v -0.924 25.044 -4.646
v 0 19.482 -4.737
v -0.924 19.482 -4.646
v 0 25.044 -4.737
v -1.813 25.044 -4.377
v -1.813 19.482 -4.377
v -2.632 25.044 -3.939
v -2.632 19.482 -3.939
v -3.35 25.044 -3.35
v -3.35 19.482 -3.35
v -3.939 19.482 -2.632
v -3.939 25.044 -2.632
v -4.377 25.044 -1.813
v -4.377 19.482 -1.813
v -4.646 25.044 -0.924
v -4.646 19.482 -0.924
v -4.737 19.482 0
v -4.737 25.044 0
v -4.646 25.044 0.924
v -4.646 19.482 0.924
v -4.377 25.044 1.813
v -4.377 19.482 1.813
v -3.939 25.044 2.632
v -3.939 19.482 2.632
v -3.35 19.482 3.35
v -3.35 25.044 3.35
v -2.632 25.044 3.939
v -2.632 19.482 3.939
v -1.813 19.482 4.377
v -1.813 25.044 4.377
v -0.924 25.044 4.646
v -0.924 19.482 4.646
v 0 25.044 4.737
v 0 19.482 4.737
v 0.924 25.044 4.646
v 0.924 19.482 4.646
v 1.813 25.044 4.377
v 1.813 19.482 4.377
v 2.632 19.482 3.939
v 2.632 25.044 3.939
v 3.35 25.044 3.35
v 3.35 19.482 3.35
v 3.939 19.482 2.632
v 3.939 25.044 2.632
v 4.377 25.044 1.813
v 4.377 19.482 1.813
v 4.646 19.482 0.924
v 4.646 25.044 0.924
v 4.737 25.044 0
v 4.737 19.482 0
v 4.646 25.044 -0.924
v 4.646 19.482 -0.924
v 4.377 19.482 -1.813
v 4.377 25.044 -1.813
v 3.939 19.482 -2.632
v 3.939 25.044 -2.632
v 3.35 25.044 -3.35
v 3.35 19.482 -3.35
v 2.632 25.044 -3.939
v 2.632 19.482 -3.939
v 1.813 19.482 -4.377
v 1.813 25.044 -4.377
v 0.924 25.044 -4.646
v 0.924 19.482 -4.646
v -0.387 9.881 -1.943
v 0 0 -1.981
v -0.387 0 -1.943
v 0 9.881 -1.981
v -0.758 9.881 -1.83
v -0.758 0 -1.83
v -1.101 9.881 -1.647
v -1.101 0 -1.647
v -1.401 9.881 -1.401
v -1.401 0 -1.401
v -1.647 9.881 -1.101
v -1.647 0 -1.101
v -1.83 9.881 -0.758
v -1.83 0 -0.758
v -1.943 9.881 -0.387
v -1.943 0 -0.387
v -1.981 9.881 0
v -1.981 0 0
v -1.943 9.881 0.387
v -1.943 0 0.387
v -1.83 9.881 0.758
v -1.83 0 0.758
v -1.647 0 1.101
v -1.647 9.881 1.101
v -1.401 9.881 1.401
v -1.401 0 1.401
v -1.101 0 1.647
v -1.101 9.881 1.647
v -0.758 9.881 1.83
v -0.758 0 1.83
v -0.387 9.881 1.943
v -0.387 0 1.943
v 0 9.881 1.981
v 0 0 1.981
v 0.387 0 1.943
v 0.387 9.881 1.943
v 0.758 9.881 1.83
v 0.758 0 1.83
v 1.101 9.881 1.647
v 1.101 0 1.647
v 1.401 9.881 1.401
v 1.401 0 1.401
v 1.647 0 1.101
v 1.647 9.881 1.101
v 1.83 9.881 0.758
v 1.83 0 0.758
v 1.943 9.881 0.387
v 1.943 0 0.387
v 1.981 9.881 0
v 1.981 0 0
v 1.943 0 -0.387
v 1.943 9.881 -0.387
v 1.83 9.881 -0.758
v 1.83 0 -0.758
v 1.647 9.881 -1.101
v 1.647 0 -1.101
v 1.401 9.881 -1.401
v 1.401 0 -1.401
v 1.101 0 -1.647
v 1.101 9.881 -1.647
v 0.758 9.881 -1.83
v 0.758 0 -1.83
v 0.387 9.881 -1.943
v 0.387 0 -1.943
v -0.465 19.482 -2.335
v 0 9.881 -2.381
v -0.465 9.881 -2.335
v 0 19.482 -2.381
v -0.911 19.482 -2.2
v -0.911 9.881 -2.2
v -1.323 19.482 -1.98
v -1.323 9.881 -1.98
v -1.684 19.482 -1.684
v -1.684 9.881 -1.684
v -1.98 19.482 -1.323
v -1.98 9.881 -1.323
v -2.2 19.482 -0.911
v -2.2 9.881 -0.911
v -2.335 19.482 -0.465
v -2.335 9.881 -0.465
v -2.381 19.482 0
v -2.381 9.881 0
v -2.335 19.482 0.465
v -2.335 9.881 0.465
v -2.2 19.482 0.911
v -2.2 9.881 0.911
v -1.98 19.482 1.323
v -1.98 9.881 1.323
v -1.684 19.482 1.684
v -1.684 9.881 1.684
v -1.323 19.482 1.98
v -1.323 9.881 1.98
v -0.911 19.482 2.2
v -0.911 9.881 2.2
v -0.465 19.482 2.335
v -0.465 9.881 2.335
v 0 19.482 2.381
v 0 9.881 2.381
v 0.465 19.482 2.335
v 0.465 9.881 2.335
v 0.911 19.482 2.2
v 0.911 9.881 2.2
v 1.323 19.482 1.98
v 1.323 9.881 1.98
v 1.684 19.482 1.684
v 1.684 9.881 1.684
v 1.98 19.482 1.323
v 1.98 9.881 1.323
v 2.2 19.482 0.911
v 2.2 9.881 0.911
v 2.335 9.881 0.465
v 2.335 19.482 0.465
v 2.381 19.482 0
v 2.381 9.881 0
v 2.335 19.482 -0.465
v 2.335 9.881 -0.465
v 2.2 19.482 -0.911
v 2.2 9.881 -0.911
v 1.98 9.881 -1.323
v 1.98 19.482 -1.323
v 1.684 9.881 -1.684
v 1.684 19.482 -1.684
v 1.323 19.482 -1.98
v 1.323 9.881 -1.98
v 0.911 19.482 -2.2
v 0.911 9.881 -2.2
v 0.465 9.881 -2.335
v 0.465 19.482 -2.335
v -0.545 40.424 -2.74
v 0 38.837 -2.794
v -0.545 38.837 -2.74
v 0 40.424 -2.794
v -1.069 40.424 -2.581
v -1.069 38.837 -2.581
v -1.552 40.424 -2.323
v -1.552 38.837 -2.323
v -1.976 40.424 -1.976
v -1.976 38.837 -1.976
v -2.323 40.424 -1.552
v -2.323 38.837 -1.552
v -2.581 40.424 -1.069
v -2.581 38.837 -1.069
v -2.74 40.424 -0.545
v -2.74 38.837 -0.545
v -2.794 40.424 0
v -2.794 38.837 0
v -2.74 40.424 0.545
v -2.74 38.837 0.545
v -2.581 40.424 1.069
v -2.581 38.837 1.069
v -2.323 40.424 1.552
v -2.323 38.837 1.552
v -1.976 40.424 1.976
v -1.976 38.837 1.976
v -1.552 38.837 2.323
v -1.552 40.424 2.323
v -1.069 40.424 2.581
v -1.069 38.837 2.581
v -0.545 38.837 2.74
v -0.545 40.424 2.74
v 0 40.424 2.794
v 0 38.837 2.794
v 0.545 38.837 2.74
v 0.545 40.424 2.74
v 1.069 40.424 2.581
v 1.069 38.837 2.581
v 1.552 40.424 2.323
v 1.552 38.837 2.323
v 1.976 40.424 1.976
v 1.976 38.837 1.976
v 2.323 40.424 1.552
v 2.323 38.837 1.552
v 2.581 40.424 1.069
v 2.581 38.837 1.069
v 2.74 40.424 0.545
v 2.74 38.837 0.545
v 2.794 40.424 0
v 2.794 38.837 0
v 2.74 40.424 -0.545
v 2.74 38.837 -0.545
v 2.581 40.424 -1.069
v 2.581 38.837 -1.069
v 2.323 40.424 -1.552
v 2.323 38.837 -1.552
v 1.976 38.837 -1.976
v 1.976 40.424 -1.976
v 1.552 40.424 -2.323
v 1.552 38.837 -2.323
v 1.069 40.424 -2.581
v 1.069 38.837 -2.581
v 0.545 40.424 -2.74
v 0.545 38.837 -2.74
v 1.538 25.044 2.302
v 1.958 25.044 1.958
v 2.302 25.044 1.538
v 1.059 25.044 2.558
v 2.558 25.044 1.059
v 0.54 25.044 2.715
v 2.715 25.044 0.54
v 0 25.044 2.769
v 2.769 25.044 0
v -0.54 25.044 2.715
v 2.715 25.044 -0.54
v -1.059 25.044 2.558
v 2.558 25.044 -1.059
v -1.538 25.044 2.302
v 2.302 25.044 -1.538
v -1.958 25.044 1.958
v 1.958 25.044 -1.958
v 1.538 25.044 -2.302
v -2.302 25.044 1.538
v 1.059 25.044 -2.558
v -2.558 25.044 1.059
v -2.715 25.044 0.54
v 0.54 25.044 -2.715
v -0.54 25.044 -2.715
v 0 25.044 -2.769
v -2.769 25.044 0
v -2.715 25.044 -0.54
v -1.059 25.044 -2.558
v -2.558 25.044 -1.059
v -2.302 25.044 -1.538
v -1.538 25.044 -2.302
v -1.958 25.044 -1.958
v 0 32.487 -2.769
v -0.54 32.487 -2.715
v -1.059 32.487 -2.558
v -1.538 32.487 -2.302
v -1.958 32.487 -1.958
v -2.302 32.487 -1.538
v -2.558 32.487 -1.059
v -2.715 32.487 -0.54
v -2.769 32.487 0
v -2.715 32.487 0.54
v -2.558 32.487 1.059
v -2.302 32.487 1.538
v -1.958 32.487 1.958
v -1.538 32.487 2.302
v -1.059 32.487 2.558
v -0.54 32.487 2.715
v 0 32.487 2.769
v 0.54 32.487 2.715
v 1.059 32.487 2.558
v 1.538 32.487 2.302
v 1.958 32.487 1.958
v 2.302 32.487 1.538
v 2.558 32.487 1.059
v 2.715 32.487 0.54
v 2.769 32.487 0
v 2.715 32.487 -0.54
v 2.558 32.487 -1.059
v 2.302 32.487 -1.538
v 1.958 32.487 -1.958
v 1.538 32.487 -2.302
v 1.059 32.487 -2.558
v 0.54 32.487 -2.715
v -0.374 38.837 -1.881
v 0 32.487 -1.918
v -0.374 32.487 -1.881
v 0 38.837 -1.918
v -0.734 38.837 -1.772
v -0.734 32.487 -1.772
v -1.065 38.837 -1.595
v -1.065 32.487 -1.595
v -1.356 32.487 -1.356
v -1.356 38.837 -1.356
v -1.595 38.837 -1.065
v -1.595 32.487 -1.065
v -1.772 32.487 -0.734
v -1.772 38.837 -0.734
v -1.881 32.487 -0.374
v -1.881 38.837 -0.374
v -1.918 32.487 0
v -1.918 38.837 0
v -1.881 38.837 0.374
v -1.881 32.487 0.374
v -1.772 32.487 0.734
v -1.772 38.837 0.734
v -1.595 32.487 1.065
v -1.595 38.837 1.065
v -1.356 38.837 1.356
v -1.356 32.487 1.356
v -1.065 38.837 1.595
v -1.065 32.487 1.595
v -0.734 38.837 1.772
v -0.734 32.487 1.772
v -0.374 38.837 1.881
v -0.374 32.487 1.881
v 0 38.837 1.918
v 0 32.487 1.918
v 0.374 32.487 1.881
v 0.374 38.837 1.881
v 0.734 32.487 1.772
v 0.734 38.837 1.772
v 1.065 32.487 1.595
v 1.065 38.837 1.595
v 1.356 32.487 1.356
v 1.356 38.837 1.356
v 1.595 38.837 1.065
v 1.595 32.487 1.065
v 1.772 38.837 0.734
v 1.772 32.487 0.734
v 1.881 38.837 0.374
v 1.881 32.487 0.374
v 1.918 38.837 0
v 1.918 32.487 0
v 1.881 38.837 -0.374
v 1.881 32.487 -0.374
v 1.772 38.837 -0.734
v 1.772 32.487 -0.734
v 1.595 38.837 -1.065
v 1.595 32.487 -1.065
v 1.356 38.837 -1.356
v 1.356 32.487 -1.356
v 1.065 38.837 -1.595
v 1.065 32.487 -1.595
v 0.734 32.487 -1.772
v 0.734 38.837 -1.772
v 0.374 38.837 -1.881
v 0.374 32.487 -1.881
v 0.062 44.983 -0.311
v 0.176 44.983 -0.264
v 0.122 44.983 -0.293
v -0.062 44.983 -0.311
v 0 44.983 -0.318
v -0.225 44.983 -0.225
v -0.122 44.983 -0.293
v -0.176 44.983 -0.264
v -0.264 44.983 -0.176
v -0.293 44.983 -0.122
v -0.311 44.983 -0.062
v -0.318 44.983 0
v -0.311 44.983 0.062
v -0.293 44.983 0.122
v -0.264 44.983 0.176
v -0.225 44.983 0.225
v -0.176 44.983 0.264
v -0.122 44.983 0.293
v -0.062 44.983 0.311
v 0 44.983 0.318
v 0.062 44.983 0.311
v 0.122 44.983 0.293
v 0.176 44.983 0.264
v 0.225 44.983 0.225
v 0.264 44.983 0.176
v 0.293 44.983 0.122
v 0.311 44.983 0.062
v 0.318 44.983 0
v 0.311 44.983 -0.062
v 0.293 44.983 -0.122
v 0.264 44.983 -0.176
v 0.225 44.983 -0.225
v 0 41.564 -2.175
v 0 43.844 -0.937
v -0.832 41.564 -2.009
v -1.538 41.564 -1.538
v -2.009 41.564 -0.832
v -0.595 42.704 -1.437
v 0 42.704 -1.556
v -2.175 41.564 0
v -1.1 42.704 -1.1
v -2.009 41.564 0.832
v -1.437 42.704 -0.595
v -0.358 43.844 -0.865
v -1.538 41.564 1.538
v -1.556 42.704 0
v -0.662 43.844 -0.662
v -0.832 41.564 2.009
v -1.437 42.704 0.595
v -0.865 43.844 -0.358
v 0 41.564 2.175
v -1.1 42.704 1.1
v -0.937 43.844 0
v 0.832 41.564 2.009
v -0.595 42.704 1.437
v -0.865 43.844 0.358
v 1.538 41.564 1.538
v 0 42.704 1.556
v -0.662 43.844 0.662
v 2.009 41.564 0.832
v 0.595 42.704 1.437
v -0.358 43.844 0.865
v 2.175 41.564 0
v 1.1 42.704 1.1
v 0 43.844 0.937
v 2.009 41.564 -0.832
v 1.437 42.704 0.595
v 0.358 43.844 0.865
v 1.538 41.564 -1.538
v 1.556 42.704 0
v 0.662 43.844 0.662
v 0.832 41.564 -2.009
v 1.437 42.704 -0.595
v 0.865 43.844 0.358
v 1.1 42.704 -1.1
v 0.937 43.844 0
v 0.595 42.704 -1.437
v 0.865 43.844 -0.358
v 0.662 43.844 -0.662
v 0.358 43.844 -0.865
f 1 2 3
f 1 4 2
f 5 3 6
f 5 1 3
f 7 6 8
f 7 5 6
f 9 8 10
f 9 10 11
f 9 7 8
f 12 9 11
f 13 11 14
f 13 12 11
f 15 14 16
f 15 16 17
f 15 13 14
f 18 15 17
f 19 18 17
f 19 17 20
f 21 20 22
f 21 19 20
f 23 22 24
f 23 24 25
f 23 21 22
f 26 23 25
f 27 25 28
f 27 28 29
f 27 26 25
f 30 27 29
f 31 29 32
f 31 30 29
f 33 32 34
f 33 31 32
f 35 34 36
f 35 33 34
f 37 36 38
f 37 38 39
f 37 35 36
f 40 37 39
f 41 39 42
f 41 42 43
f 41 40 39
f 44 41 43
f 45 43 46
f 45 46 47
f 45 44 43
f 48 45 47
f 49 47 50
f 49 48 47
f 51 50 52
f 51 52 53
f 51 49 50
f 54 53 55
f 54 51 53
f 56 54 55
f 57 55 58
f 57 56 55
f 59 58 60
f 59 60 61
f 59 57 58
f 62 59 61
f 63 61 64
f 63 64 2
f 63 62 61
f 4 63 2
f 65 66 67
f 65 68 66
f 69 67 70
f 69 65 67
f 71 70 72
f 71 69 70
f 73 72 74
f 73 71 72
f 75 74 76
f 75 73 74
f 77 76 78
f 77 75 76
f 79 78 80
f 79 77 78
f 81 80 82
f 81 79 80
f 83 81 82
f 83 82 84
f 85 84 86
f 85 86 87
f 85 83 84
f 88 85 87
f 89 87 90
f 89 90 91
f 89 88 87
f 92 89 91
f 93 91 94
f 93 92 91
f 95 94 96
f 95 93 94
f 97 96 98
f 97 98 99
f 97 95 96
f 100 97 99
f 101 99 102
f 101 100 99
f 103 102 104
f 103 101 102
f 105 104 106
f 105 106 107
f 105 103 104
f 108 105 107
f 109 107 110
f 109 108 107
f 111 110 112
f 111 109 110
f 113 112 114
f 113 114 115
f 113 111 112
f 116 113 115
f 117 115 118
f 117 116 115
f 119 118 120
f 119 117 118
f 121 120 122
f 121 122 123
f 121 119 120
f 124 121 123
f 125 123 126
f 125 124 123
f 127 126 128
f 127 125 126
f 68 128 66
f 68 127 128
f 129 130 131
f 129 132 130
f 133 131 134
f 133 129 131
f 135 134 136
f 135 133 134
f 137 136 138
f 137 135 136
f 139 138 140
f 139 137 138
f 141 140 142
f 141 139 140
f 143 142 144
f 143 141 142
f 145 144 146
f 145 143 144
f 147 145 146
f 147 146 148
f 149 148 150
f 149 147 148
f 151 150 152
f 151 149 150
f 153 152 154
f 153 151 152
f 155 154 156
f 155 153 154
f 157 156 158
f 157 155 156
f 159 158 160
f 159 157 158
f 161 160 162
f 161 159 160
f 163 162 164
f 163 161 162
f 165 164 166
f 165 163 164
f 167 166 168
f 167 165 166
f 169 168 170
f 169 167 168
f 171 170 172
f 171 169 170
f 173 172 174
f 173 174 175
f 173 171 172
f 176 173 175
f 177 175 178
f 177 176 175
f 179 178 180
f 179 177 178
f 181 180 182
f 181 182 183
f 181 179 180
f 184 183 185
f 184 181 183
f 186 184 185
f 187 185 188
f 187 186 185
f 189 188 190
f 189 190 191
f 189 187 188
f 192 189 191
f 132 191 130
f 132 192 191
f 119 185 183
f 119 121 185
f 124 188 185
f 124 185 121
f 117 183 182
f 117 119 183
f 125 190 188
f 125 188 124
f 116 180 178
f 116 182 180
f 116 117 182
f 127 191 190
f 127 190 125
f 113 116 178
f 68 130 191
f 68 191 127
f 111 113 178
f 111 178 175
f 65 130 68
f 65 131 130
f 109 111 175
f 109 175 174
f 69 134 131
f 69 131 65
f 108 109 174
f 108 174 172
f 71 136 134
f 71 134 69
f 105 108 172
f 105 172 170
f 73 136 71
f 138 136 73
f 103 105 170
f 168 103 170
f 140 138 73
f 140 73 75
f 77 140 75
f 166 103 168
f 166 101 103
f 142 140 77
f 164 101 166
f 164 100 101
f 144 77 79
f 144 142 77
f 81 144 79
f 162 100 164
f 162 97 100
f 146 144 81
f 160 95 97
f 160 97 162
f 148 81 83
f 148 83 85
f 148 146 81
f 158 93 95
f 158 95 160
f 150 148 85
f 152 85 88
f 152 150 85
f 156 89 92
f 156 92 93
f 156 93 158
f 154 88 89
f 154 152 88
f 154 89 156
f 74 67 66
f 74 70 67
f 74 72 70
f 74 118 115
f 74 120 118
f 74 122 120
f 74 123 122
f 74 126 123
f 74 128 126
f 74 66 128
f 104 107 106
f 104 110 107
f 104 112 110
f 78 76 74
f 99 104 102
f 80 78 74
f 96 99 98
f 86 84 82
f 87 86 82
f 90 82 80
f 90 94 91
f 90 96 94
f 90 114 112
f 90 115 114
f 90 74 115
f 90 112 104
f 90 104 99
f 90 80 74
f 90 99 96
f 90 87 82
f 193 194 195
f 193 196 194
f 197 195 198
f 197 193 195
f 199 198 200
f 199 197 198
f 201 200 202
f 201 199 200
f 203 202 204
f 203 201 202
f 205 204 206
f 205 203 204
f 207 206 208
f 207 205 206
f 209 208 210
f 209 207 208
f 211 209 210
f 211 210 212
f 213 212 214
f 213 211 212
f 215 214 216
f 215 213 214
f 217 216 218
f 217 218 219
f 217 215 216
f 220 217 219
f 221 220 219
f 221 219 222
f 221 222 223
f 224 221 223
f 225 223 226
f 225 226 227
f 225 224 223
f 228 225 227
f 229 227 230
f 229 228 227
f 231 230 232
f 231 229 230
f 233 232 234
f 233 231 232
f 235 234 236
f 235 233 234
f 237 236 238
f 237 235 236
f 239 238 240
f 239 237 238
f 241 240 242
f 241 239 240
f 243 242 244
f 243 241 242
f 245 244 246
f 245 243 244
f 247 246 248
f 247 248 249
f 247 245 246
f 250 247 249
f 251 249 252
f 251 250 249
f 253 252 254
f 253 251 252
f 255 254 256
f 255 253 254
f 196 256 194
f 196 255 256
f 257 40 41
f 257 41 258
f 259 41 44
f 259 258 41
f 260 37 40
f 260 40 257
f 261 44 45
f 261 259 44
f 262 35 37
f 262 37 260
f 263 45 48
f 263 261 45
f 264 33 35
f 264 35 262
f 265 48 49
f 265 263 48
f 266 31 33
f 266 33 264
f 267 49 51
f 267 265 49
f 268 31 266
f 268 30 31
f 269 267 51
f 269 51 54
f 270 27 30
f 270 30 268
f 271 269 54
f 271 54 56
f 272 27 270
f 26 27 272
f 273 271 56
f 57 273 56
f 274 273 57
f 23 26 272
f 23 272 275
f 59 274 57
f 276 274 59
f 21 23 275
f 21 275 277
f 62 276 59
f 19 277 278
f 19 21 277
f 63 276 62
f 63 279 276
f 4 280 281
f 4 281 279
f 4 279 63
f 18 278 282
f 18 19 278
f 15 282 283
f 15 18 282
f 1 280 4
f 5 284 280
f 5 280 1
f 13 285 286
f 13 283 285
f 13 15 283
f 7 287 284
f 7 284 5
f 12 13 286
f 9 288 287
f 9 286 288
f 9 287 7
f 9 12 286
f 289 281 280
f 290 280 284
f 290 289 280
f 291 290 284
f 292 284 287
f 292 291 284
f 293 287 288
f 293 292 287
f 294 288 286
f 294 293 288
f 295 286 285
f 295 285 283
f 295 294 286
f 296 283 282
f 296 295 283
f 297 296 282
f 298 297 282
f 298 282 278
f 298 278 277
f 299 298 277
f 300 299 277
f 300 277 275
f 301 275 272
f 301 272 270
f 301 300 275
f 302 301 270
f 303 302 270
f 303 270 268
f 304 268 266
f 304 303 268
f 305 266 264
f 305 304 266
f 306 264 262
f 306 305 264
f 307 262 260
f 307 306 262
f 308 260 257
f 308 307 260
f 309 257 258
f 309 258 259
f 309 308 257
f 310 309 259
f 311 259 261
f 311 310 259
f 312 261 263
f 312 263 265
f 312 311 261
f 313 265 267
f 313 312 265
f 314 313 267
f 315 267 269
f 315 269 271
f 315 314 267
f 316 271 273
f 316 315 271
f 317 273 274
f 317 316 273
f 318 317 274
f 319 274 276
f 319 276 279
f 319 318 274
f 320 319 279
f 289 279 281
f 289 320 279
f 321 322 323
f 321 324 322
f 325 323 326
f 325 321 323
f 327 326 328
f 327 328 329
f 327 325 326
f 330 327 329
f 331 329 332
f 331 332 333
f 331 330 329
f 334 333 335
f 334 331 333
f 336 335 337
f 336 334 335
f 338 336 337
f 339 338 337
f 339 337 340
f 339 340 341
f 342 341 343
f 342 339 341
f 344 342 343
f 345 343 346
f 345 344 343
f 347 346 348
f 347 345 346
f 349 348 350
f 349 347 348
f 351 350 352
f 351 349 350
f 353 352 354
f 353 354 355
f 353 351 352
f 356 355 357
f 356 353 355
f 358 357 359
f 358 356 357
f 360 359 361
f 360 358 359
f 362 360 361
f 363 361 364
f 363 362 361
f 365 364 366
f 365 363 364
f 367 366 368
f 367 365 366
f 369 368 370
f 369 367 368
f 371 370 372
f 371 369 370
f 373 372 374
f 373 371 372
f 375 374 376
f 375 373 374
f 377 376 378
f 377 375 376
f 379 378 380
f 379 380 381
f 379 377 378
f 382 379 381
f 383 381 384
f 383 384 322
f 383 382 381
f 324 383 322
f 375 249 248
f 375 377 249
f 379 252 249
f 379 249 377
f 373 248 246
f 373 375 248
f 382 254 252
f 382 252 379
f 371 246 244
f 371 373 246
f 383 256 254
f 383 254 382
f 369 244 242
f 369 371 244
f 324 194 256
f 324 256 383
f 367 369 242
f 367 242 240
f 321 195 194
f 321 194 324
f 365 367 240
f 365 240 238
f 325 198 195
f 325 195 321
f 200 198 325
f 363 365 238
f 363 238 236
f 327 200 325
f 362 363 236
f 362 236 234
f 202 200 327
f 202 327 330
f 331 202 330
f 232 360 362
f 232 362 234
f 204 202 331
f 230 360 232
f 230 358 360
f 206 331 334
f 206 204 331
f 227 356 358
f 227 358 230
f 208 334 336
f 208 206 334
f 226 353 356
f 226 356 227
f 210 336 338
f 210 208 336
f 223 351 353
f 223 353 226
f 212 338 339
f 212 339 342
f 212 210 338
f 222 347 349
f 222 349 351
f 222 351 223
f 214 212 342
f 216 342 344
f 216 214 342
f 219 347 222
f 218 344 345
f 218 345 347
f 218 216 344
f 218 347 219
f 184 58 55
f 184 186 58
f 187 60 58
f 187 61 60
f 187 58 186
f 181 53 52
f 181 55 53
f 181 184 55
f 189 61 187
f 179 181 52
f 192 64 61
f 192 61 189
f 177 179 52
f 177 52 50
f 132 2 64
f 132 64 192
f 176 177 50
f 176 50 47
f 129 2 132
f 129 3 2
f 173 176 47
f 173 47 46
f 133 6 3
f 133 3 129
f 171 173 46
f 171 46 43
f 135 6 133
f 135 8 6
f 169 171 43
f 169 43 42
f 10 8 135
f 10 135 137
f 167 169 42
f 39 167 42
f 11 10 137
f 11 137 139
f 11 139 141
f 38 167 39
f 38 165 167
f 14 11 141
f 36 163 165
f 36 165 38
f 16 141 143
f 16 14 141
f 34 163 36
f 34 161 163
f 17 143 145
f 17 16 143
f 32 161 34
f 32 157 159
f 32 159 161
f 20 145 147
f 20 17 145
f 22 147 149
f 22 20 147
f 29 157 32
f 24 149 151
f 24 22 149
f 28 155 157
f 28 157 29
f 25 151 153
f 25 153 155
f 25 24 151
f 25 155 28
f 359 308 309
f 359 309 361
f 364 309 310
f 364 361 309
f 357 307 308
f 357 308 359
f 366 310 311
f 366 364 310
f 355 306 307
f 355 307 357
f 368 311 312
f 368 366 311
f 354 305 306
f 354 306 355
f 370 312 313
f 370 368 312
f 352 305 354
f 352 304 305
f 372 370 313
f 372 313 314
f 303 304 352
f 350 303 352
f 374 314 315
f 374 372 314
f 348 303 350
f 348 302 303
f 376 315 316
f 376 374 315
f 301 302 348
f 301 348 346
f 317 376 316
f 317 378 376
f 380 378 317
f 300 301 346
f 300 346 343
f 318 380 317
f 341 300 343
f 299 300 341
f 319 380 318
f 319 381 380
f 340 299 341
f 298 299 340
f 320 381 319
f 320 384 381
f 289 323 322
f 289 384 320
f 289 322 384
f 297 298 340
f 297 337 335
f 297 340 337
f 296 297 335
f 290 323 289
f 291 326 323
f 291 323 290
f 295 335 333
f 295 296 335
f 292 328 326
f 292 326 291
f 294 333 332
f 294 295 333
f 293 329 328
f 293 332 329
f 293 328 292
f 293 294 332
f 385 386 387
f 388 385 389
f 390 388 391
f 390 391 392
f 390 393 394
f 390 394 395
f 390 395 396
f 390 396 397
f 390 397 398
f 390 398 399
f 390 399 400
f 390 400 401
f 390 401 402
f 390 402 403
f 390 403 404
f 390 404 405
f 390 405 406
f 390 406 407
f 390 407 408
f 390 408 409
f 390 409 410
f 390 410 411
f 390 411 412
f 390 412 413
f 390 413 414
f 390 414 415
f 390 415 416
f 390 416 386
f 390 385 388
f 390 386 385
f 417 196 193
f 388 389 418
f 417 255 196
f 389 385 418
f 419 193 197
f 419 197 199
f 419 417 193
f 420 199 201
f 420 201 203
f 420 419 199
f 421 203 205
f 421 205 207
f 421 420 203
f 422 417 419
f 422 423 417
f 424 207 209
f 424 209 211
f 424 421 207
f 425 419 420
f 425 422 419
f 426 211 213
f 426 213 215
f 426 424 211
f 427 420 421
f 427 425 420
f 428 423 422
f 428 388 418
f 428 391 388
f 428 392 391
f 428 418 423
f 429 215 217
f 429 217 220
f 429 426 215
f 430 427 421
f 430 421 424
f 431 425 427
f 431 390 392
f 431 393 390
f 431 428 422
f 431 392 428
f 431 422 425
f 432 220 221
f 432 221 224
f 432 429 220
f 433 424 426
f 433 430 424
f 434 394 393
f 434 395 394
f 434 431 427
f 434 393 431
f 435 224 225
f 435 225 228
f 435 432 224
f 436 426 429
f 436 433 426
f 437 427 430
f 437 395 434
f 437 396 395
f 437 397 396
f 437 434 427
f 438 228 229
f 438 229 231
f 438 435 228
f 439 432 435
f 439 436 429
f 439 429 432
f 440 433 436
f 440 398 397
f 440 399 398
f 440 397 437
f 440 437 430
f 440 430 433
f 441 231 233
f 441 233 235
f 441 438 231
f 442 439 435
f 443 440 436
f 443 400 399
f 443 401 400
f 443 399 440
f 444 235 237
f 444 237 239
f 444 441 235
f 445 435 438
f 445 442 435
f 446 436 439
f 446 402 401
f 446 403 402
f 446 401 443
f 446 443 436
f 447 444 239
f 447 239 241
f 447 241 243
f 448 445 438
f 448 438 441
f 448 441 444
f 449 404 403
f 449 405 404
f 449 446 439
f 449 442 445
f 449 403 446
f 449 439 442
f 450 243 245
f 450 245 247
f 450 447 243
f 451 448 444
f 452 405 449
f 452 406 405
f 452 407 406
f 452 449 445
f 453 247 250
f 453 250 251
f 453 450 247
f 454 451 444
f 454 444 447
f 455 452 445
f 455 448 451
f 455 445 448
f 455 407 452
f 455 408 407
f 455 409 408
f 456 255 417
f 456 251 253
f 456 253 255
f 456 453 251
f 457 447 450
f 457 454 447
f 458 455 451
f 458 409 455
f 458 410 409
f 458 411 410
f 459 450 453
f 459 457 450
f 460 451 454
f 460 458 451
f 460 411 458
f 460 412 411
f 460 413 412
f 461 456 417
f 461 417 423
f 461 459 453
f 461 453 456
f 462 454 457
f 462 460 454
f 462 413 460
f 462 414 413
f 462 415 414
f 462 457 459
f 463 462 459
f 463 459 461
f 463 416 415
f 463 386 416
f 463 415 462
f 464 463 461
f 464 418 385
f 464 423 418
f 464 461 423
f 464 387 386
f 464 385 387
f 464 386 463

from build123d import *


with BuildPart() as part:
    # Sketch1 → Revolve1 (revolve)
    with BuildSketch(Plane.XY, mode=Mode.PRIVATE) as revolve1_sk:
        Polygon((0, 0), (1.9812, 0), (1.9812, 9.8806), (2.38125, 9.8806), (2.38125, 19.4818), (4.7371, 19.4818), (4.7371, 25.0444), (2.7686, 25.0444), (2.7686, 32.4866), (1.9177, 32.4866), (1.9177, 38.8366), (2.794, 38.8366), (2.794, 40.4241), (0.3175, 44.9834), (0, 44.9834), align=None)
    revolve(revolve1_sk.sketch.rotate(Axis((0, 0, 0), (0, 1, 0)), 90), axis=Axis((0, 0, 0), (0, 1, 0)))  # turned: the seam where the file's is


solid = part.part
